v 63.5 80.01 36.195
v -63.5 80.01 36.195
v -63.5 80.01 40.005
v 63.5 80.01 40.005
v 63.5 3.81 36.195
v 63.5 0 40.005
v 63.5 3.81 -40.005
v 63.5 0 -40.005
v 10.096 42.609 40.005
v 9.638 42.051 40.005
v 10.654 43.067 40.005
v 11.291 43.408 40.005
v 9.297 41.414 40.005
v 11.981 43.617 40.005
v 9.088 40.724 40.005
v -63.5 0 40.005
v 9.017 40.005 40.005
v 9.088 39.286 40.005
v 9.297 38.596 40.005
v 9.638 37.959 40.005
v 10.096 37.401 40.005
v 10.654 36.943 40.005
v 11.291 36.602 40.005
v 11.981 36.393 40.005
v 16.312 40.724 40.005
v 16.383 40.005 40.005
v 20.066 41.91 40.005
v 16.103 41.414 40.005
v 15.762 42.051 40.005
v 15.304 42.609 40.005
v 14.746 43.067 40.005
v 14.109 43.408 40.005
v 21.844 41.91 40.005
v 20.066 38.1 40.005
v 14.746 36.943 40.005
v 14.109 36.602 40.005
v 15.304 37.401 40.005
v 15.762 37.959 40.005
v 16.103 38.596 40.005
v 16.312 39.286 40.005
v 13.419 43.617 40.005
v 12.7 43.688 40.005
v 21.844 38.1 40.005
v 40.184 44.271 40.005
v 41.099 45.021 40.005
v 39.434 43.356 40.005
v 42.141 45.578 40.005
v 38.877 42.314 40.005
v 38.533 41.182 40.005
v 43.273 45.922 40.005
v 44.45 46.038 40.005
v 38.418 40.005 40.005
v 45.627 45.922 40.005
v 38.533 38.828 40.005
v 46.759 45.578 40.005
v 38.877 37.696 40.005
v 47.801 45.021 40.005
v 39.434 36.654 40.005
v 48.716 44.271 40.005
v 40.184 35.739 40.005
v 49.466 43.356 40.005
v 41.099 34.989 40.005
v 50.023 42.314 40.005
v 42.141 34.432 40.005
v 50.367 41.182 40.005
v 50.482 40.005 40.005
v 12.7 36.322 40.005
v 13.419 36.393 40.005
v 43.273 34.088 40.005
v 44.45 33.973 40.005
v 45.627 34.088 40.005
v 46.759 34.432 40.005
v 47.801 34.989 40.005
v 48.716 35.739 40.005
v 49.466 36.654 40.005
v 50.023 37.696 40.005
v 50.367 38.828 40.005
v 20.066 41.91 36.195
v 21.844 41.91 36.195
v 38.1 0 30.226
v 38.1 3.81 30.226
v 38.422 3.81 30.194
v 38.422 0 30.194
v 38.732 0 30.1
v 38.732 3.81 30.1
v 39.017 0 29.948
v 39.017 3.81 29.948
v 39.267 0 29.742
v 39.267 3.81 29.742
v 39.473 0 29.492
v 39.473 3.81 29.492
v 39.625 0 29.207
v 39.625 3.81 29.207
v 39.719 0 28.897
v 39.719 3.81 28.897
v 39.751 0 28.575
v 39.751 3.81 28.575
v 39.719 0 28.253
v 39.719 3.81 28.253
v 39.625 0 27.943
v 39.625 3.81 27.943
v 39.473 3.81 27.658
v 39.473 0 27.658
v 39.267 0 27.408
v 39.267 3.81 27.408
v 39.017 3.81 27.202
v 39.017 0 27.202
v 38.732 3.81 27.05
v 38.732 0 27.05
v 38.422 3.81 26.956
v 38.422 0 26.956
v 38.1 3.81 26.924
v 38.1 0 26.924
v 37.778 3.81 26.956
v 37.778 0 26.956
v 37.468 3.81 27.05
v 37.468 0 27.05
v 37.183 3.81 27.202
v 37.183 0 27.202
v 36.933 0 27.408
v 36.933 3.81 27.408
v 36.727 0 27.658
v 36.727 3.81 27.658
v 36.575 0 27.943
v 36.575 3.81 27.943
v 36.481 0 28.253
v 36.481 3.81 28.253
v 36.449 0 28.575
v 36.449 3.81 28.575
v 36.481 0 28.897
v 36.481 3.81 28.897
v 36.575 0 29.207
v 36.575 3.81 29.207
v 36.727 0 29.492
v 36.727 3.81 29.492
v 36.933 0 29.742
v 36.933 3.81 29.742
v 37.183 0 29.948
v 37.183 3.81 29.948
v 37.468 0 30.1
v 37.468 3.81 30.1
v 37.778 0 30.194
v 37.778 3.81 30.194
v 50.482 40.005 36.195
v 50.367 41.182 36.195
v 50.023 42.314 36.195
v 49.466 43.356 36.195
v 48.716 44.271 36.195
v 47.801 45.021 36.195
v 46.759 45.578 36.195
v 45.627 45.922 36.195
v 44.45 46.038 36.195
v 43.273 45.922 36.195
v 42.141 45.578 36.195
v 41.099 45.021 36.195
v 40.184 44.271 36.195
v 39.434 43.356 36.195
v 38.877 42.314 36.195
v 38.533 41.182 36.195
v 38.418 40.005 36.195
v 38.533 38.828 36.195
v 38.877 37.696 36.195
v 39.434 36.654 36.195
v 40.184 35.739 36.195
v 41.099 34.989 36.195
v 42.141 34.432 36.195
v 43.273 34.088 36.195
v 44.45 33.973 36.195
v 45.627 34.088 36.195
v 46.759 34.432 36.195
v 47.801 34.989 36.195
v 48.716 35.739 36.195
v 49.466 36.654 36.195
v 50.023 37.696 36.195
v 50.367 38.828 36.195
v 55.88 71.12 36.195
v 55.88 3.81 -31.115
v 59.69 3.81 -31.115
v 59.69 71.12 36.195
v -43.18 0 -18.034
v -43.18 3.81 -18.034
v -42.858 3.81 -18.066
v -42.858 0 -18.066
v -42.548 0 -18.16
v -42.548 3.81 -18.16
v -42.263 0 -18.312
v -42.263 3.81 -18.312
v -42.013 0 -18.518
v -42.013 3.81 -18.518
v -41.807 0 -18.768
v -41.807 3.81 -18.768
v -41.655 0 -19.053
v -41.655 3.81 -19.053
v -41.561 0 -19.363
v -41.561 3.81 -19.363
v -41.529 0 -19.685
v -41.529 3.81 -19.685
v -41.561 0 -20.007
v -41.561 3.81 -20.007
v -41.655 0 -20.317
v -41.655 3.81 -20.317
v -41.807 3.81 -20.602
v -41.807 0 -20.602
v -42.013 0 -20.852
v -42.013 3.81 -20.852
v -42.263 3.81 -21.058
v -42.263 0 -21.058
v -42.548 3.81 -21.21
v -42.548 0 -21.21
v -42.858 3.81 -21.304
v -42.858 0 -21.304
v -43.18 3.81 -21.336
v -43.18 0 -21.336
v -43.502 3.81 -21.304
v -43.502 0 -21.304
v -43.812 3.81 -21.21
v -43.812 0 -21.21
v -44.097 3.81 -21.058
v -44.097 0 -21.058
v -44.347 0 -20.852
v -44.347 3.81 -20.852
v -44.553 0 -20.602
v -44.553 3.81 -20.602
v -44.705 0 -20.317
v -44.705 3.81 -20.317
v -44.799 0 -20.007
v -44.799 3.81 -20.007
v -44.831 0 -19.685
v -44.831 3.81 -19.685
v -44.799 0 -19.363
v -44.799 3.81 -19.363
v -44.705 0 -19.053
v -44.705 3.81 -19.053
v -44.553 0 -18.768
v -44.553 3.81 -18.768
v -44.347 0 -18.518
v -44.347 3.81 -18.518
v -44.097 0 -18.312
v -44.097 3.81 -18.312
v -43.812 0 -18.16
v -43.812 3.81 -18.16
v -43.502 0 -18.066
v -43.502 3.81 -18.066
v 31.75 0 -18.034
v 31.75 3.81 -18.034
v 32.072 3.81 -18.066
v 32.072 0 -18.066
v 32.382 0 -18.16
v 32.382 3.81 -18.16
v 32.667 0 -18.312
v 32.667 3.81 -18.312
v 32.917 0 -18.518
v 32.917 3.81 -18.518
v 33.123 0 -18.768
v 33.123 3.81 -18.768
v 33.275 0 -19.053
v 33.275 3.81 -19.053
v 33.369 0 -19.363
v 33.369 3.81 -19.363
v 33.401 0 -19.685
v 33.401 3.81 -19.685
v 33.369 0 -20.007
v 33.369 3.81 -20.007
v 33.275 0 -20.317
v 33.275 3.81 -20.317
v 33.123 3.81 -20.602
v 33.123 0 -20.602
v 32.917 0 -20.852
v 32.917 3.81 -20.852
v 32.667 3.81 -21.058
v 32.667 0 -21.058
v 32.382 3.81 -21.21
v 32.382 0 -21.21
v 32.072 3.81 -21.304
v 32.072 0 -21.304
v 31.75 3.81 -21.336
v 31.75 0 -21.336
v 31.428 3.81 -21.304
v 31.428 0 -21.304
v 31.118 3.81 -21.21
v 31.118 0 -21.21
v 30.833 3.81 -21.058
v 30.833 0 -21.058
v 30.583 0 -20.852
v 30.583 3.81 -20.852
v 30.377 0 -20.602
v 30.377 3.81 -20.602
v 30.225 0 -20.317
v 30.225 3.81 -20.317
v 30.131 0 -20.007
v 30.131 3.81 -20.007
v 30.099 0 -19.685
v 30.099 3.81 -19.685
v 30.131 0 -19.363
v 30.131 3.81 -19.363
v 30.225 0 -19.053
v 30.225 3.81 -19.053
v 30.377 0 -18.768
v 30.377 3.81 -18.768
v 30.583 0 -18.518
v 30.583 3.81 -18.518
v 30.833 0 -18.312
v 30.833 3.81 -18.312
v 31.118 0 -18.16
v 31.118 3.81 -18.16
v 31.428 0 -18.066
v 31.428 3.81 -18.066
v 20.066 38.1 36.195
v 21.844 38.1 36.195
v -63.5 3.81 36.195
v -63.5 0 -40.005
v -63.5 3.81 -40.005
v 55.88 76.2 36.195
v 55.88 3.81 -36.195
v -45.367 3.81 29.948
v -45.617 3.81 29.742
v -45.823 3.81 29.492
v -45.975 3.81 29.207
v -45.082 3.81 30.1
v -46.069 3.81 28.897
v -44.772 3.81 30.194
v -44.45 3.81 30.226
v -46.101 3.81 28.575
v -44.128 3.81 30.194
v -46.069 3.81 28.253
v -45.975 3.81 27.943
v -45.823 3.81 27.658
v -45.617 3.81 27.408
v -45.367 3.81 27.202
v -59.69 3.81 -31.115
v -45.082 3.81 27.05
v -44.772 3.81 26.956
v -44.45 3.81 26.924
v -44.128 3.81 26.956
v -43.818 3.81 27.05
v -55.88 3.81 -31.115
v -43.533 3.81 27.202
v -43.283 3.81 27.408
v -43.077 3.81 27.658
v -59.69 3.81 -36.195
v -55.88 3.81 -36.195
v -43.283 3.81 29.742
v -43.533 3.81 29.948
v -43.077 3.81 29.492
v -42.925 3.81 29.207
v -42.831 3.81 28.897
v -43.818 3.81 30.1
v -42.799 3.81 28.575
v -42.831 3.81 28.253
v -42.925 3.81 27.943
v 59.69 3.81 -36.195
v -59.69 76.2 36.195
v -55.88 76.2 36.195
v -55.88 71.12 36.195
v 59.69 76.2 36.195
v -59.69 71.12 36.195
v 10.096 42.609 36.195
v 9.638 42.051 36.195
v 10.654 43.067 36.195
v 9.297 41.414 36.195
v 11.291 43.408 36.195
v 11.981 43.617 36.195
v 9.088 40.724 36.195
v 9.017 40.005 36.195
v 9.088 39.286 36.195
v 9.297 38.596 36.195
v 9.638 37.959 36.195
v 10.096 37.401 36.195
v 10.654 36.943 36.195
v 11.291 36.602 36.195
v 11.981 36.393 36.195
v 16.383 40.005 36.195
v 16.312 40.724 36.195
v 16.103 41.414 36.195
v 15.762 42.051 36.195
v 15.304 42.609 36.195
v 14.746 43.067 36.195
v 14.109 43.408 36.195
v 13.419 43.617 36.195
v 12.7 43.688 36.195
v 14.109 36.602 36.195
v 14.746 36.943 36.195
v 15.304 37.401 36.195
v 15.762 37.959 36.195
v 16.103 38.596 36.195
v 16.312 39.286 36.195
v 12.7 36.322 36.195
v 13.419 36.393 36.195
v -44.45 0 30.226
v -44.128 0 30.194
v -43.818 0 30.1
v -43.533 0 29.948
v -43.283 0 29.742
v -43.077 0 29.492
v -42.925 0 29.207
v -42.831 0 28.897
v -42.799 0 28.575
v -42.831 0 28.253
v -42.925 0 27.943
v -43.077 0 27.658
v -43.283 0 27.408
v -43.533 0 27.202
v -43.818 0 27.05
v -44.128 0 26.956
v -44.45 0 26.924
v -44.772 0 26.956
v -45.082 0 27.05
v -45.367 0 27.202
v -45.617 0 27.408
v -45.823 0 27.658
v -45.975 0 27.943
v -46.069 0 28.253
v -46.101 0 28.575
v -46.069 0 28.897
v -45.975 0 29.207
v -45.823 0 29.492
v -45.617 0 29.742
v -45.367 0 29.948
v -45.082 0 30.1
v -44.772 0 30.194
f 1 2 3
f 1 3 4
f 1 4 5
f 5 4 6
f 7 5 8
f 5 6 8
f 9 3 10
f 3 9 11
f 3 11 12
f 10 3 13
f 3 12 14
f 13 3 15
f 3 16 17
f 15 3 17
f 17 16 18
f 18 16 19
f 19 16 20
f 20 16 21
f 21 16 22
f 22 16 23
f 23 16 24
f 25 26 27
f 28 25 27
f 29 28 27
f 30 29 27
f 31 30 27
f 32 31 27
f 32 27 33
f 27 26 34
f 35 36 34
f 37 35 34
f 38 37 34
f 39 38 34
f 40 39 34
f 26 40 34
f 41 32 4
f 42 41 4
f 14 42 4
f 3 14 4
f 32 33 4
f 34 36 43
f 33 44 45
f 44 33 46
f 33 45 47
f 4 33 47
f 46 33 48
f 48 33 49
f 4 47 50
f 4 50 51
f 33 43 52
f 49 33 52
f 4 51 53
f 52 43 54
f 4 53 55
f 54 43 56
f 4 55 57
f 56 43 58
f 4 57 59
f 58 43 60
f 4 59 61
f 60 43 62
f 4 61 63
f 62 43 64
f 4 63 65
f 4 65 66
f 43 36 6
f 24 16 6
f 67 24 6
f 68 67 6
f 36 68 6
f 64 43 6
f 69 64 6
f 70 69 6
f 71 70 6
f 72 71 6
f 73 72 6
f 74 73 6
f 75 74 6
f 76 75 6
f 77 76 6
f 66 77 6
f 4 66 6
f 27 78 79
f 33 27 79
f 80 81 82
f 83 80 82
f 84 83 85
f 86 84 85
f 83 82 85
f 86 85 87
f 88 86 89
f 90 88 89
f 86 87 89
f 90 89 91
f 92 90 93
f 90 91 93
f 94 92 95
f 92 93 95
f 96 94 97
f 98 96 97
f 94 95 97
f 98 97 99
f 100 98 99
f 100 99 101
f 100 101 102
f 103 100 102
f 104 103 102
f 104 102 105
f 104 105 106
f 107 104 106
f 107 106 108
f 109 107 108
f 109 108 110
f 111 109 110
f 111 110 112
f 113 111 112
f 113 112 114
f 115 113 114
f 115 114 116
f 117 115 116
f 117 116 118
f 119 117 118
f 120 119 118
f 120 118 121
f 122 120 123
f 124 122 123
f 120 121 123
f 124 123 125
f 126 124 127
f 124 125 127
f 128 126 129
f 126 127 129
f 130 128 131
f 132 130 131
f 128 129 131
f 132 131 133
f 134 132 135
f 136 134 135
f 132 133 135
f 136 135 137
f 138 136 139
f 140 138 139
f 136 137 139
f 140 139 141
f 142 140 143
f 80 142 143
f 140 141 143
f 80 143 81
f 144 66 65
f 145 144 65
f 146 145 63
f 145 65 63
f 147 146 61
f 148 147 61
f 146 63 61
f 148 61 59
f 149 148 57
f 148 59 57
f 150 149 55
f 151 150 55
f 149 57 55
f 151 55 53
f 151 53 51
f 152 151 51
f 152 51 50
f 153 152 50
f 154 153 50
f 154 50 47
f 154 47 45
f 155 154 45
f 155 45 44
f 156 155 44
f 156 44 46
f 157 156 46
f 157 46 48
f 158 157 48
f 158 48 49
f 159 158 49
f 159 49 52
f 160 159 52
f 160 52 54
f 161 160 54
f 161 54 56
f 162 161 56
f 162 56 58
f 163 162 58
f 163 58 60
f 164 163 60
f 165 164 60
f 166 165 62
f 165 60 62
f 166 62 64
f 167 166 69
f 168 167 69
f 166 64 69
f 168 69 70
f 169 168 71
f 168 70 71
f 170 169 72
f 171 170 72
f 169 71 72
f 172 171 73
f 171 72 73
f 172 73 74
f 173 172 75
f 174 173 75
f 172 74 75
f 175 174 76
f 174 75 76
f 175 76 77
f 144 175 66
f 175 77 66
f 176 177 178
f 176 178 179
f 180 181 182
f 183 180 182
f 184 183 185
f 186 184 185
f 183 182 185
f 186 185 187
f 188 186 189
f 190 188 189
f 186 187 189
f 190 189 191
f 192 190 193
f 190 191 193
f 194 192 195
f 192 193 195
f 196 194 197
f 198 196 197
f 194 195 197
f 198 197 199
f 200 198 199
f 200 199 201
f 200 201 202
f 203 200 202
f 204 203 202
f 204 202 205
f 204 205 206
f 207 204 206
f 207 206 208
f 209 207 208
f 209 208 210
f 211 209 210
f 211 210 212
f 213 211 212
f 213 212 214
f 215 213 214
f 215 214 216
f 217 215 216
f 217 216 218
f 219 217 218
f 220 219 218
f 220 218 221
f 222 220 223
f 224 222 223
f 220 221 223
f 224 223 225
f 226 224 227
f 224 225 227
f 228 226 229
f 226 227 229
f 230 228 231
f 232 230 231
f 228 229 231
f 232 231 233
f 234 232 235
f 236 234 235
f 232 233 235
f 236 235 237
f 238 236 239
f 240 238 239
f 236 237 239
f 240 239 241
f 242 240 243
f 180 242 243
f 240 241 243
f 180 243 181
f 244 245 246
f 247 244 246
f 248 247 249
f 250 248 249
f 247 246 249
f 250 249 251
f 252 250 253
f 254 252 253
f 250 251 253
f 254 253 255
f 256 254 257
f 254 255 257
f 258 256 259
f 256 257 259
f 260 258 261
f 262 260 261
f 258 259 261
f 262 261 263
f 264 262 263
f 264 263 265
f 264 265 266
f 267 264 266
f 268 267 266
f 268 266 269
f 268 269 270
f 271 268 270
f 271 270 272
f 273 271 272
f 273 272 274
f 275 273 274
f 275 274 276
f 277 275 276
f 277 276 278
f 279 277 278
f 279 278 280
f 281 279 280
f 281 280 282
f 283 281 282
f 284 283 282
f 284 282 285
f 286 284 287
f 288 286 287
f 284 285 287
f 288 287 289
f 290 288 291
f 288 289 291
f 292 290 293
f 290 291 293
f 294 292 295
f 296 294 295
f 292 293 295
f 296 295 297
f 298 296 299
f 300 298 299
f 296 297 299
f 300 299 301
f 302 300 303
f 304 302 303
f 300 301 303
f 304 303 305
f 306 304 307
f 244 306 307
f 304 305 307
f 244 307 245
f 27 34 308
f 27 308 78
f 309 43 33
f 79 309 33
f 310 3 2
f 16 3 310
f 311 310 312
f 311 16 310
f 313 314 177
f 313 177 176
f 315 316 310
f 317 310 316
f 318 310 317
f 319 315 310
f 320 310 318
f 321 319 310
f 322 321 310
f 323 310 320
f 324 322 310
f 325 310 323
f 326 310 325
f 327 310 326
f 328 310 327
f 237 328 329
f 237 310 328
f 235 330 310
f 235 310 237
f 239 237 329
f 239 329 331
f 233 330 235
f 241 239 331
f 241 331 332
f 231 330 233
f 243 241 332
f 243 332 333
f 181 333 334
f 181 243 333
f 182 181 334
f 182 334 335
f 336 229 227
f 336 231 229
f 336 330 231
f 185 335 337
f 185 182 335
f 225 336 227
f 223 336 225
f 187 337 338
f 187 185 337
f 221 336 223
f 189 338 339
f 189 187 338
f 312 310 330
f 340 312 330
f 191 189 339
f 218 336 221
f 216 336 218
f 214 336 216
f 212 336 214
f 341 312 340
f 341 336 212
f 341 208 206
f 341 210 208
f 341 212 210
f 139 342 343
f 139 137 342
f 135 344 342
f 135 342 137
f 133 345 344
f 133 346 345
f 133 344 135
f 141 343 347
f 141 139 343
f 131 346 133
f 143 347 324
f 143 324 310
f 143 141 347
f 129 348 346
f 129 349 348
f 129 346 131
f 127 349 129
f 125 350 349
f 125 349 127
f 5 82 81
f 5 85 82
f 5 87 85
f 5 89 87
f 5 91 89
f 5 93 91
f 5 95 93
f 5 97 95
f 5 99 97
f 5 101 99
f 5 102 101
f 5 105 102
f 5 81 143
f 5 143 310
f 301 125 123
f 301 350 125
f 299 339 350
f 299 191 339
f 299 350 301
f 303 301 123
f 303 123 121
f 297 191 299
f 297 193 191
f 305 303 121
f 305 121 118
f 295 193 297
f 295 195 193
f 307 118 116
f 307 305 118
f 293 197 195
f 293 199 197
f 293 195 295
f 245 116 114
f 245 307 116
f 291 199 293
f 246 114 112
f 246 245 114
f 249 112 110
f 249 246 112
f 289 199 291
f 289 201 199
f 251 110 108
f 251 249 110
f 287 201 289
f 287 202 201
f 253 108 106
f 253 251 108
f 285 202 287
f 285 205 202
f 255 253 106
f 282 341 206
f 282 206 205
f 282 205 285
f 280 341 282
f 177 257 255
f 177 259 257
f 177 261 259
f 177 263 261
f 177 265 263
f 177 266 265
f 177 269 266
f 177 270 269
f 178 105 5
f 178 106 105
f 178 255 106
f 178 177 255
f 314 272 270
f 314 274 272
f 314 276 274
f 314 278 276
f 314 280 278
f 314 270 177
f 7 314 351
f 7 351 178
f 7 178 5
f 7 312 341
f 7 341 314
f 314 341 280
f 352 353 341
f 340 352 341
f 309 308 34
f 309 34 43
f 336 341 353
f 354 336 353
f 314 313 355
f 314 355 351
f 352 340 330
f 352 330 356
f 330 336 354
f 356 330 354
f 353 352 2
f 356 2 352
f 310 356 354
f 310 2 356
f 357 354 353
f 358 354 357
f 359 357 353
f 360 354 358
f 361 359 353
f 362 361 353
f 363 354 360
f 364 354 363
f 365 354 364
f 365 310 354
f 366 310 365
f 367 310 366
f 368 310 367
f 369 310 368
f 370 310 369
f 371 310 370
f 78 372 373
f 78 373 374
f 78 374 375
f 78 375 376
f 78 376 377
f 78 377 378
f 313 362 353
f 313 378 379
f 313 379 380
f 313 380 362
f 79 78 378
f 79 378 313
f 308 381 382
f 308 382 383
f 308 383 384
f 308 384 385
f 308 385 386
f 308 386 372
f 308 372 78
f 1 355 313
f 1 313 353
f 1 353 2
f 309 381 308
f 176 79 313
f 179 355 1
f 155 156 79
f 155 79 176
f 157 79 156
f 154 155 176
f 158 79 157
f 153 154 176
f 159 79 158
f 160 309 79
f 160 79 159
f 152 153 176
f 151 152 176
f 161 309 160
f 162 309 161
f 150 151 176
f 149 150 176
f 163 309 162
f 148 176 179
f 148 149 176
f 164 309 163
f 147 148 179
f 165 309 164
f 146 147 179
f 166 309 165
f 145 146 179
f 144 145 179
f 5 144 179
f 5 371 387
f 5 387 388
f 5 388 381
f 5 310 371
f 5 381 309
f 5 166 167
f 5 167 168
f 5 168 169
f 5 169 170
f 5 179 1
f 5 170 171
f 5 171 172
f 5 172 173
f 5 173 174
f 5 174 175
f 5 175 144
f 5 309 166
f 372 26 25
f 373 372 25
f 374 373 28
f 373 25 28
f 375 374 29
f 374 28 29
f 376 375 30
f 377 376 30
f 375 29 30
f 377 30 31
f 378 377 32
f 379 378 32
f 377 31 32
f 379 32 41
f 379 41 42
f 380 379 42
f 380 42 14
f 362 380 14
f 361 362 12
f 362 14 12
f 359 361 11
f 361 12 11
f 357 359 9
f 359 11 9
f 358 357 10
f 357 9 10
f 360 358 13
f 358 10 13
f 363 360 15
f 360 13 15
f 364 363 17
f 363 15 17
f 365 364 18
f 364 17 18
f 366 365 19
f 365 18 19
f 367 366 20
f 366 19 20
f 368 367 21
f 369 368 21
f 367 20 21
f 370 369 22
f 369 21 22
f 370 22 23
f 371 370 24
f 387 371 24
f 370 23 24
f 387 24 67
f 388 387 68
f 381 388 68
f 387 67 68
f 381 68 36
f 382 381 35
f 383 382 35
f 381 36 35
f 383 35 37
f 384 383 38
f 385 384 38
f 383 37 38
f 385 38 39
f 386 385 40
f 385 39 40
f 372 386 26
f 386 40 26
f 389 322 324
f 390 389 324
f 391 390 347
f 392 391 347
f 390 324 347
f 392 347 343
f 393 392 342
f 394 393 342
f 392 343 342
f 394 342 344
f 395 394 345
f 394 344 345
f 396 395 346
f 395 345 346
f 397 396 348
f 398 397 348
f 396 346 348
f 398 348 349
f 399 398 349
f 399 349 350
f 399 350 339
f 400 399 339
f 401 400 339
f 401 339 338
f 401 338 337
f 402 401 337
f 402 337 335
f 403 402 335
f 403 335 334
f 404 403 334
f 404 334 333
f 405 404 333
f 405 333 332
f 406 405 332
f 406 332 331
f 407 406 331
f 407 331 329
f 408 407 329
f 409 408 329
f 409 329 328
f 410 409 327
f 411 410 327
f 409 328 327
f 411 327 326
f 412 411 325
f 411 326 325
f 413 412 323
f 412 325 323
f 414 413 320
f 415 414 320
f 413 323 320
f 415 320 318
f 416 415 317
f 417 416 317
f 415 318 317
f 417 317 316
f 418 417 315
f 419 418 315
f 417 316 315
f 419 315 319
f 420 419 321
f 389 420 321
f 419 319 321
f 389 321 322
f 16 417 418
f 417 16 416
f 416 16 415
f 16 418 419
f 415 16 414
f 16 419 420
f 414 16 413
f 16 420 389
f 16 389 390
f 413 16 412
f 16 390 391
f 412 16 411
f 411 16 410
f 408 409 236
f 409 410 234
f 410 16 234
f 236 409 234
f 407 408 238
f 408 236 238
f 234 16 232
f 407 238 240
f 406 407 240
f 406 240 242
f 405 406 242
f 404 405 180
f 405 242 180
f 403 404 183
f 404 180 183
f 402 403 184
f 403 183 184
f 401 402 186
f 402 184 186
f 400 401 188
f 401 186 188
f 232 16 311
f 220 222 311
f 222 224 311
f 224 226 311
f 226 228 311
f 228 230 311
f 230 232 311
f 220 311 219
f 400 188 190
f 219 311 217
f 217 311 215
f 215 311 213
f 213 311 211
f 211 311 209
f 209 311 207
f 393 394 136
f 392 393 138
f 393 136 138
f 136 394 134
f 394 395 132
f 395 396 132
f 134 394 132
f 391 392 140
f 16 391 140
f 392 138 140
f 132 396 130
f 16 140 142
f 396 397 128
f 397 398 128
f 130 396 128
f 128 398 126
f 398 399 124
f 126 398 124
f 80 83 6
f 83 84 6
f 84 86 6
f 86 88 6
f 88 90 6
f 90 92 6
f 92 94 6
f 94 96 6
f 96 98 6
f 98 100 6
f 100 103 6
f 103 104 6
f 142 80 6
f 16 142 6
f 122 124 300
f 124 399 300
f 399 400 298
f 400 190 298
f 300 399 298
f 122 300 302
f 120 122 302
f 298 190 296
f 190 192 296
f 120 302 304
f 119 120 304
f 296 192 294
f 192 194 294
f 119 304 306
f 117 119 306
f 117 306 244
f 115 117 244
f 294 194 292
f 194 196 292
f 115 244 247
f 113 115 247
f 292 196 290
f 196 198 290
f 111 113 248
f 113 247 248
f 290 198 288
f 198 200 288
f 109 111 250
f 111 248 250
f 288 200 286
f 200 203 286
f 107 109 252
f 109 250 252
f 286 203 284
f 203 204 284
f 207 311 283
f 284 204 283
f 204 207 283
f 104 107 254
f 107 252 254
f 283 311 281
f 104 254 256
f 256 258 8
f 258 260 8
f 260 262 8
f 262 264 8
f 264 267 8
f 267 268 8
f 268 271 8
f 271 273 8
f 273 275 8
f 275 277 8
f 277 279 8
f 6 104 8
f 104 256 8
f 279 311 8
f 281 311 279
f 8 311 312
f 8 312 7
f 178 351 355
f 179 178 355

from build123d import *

# Parameters (mm, degrees)
SKETCH1_W                    = 127
SKETCH1_H                    = 80.01
BASE_DEPTH                   = 3.81
SKETCH2_W                    = 127
SKETCH2_H                    = 3.81
FRONT_PANELING_DEPTH         = 76.2
SKETCH4_R                    = 1.651
ARDUINO_MOUNTING_HOLES_DEPTH = 107.95368168
STABILITY_STRUT_DEPTH        = 3.81
SKETCH5_R                    = 6.0325
ON_OFF_SWITCH_RECESS_DEPTH   = 130.751494018
SKETCH7_R                    = 3.683
SKETCH7_W                    = 1.778
SKETCH7_H                    = 3.81
POTENTIOMETER_RECESS_DEPTH   = 3.81


with BuildPart() as part:
    # Sketch1 → Base (new body)
    with BuildSketch(Plane(origin=(0, 0, 0), x_dir=(1, 0, 0), z_dir=(0, 1, 0))):
        Rectangle(SKETCH1_W, SKETCH1_H)
    extrude(amount=BASE_DEPTH)

    # Sketch2 → Front Paneling (add)
    with BuildSketch(Plane(origin=(0, 3.81, 0), x_dir=(1, 0, 0), z_dir=(0, 1, 0))):
        with Locations((0, -38.1)):
            Rectangle(SKETCH2_W, SKETCH2_H)
    extrude(amount=FRONT_PANELING_DEPTH)

    # Sketch4 → Arduino Mounting Holes (cut, through all)
    with BuildSketch(Plane(origin=(0, 3.81, 0), x_dir=(1, 0, 0), z_dir=(0, 1, 0))):
        with Locations(Location((-44.45, -28.575, 0), (0, 0, 270))):
            Circle(SKETCH4_R)
        with Locations(Location((-43.18, 19.685, 0), (0, 0, 270))):
            Circle(SKETCH4_R)
        with Locations(Location((31.75, 19.685, 0), (0, 0, 270))):
            Circle(SKETCH4_R)
        with Locations(Location((38.1, -28.575, 0), (0, 0, 270))):
            Circle(SKETCH4_R)
    extrude(amount=-ARDUINO_MOUNTING_HOLES_DEPTH, mode=Mode.SUBTRACT)

    # Sketch3 → Stability Strut (add)
    with BuildSketch(Plane.ZY.offset(55.88)):
        Polygon((36.195, 76.2), (-36.195, 3.81), (-31.115, 3.81), (36.195, 71.12), align=None)
    stability_strut = extrude(amount=STABILITY_STRUT_DEPTH)

    # Mirror Strut: Stability Strut across plane
    add(stability_strut.mirror(Plane(origin=(0, 0, 0), x_dir=(0, 0, 1), z_dir=(1, 0, 0))))

    # Sketch5 → On Off Switch Recess (cut, through all)
    with BuildSketch(Plane.XY.offset(40.005)):
        with Locations((44.45, 40.005)):
            Circle(SKETCH5_R)
    extrude(amount=-ON_OFF_SWITCH_RECESS_DEPTH, mode=Mode.SUBTRACT)

    # Sketch7 → Potentiometer Recess (cut)
    with BuildSketch(Plane.XY.offset(40.005)):
        with Locations((12.7, 40.005)):
            Circle(SKETCH7_R)
        with Locations((20.955, 40.005)):
            Rectangle(SKETCH7_W, SKETCH7_H)
    extrude(amount=-POTENTIOMETER_RECESS_DEPTH, mode=Mode.SUBTRACT)


solid = part.part
